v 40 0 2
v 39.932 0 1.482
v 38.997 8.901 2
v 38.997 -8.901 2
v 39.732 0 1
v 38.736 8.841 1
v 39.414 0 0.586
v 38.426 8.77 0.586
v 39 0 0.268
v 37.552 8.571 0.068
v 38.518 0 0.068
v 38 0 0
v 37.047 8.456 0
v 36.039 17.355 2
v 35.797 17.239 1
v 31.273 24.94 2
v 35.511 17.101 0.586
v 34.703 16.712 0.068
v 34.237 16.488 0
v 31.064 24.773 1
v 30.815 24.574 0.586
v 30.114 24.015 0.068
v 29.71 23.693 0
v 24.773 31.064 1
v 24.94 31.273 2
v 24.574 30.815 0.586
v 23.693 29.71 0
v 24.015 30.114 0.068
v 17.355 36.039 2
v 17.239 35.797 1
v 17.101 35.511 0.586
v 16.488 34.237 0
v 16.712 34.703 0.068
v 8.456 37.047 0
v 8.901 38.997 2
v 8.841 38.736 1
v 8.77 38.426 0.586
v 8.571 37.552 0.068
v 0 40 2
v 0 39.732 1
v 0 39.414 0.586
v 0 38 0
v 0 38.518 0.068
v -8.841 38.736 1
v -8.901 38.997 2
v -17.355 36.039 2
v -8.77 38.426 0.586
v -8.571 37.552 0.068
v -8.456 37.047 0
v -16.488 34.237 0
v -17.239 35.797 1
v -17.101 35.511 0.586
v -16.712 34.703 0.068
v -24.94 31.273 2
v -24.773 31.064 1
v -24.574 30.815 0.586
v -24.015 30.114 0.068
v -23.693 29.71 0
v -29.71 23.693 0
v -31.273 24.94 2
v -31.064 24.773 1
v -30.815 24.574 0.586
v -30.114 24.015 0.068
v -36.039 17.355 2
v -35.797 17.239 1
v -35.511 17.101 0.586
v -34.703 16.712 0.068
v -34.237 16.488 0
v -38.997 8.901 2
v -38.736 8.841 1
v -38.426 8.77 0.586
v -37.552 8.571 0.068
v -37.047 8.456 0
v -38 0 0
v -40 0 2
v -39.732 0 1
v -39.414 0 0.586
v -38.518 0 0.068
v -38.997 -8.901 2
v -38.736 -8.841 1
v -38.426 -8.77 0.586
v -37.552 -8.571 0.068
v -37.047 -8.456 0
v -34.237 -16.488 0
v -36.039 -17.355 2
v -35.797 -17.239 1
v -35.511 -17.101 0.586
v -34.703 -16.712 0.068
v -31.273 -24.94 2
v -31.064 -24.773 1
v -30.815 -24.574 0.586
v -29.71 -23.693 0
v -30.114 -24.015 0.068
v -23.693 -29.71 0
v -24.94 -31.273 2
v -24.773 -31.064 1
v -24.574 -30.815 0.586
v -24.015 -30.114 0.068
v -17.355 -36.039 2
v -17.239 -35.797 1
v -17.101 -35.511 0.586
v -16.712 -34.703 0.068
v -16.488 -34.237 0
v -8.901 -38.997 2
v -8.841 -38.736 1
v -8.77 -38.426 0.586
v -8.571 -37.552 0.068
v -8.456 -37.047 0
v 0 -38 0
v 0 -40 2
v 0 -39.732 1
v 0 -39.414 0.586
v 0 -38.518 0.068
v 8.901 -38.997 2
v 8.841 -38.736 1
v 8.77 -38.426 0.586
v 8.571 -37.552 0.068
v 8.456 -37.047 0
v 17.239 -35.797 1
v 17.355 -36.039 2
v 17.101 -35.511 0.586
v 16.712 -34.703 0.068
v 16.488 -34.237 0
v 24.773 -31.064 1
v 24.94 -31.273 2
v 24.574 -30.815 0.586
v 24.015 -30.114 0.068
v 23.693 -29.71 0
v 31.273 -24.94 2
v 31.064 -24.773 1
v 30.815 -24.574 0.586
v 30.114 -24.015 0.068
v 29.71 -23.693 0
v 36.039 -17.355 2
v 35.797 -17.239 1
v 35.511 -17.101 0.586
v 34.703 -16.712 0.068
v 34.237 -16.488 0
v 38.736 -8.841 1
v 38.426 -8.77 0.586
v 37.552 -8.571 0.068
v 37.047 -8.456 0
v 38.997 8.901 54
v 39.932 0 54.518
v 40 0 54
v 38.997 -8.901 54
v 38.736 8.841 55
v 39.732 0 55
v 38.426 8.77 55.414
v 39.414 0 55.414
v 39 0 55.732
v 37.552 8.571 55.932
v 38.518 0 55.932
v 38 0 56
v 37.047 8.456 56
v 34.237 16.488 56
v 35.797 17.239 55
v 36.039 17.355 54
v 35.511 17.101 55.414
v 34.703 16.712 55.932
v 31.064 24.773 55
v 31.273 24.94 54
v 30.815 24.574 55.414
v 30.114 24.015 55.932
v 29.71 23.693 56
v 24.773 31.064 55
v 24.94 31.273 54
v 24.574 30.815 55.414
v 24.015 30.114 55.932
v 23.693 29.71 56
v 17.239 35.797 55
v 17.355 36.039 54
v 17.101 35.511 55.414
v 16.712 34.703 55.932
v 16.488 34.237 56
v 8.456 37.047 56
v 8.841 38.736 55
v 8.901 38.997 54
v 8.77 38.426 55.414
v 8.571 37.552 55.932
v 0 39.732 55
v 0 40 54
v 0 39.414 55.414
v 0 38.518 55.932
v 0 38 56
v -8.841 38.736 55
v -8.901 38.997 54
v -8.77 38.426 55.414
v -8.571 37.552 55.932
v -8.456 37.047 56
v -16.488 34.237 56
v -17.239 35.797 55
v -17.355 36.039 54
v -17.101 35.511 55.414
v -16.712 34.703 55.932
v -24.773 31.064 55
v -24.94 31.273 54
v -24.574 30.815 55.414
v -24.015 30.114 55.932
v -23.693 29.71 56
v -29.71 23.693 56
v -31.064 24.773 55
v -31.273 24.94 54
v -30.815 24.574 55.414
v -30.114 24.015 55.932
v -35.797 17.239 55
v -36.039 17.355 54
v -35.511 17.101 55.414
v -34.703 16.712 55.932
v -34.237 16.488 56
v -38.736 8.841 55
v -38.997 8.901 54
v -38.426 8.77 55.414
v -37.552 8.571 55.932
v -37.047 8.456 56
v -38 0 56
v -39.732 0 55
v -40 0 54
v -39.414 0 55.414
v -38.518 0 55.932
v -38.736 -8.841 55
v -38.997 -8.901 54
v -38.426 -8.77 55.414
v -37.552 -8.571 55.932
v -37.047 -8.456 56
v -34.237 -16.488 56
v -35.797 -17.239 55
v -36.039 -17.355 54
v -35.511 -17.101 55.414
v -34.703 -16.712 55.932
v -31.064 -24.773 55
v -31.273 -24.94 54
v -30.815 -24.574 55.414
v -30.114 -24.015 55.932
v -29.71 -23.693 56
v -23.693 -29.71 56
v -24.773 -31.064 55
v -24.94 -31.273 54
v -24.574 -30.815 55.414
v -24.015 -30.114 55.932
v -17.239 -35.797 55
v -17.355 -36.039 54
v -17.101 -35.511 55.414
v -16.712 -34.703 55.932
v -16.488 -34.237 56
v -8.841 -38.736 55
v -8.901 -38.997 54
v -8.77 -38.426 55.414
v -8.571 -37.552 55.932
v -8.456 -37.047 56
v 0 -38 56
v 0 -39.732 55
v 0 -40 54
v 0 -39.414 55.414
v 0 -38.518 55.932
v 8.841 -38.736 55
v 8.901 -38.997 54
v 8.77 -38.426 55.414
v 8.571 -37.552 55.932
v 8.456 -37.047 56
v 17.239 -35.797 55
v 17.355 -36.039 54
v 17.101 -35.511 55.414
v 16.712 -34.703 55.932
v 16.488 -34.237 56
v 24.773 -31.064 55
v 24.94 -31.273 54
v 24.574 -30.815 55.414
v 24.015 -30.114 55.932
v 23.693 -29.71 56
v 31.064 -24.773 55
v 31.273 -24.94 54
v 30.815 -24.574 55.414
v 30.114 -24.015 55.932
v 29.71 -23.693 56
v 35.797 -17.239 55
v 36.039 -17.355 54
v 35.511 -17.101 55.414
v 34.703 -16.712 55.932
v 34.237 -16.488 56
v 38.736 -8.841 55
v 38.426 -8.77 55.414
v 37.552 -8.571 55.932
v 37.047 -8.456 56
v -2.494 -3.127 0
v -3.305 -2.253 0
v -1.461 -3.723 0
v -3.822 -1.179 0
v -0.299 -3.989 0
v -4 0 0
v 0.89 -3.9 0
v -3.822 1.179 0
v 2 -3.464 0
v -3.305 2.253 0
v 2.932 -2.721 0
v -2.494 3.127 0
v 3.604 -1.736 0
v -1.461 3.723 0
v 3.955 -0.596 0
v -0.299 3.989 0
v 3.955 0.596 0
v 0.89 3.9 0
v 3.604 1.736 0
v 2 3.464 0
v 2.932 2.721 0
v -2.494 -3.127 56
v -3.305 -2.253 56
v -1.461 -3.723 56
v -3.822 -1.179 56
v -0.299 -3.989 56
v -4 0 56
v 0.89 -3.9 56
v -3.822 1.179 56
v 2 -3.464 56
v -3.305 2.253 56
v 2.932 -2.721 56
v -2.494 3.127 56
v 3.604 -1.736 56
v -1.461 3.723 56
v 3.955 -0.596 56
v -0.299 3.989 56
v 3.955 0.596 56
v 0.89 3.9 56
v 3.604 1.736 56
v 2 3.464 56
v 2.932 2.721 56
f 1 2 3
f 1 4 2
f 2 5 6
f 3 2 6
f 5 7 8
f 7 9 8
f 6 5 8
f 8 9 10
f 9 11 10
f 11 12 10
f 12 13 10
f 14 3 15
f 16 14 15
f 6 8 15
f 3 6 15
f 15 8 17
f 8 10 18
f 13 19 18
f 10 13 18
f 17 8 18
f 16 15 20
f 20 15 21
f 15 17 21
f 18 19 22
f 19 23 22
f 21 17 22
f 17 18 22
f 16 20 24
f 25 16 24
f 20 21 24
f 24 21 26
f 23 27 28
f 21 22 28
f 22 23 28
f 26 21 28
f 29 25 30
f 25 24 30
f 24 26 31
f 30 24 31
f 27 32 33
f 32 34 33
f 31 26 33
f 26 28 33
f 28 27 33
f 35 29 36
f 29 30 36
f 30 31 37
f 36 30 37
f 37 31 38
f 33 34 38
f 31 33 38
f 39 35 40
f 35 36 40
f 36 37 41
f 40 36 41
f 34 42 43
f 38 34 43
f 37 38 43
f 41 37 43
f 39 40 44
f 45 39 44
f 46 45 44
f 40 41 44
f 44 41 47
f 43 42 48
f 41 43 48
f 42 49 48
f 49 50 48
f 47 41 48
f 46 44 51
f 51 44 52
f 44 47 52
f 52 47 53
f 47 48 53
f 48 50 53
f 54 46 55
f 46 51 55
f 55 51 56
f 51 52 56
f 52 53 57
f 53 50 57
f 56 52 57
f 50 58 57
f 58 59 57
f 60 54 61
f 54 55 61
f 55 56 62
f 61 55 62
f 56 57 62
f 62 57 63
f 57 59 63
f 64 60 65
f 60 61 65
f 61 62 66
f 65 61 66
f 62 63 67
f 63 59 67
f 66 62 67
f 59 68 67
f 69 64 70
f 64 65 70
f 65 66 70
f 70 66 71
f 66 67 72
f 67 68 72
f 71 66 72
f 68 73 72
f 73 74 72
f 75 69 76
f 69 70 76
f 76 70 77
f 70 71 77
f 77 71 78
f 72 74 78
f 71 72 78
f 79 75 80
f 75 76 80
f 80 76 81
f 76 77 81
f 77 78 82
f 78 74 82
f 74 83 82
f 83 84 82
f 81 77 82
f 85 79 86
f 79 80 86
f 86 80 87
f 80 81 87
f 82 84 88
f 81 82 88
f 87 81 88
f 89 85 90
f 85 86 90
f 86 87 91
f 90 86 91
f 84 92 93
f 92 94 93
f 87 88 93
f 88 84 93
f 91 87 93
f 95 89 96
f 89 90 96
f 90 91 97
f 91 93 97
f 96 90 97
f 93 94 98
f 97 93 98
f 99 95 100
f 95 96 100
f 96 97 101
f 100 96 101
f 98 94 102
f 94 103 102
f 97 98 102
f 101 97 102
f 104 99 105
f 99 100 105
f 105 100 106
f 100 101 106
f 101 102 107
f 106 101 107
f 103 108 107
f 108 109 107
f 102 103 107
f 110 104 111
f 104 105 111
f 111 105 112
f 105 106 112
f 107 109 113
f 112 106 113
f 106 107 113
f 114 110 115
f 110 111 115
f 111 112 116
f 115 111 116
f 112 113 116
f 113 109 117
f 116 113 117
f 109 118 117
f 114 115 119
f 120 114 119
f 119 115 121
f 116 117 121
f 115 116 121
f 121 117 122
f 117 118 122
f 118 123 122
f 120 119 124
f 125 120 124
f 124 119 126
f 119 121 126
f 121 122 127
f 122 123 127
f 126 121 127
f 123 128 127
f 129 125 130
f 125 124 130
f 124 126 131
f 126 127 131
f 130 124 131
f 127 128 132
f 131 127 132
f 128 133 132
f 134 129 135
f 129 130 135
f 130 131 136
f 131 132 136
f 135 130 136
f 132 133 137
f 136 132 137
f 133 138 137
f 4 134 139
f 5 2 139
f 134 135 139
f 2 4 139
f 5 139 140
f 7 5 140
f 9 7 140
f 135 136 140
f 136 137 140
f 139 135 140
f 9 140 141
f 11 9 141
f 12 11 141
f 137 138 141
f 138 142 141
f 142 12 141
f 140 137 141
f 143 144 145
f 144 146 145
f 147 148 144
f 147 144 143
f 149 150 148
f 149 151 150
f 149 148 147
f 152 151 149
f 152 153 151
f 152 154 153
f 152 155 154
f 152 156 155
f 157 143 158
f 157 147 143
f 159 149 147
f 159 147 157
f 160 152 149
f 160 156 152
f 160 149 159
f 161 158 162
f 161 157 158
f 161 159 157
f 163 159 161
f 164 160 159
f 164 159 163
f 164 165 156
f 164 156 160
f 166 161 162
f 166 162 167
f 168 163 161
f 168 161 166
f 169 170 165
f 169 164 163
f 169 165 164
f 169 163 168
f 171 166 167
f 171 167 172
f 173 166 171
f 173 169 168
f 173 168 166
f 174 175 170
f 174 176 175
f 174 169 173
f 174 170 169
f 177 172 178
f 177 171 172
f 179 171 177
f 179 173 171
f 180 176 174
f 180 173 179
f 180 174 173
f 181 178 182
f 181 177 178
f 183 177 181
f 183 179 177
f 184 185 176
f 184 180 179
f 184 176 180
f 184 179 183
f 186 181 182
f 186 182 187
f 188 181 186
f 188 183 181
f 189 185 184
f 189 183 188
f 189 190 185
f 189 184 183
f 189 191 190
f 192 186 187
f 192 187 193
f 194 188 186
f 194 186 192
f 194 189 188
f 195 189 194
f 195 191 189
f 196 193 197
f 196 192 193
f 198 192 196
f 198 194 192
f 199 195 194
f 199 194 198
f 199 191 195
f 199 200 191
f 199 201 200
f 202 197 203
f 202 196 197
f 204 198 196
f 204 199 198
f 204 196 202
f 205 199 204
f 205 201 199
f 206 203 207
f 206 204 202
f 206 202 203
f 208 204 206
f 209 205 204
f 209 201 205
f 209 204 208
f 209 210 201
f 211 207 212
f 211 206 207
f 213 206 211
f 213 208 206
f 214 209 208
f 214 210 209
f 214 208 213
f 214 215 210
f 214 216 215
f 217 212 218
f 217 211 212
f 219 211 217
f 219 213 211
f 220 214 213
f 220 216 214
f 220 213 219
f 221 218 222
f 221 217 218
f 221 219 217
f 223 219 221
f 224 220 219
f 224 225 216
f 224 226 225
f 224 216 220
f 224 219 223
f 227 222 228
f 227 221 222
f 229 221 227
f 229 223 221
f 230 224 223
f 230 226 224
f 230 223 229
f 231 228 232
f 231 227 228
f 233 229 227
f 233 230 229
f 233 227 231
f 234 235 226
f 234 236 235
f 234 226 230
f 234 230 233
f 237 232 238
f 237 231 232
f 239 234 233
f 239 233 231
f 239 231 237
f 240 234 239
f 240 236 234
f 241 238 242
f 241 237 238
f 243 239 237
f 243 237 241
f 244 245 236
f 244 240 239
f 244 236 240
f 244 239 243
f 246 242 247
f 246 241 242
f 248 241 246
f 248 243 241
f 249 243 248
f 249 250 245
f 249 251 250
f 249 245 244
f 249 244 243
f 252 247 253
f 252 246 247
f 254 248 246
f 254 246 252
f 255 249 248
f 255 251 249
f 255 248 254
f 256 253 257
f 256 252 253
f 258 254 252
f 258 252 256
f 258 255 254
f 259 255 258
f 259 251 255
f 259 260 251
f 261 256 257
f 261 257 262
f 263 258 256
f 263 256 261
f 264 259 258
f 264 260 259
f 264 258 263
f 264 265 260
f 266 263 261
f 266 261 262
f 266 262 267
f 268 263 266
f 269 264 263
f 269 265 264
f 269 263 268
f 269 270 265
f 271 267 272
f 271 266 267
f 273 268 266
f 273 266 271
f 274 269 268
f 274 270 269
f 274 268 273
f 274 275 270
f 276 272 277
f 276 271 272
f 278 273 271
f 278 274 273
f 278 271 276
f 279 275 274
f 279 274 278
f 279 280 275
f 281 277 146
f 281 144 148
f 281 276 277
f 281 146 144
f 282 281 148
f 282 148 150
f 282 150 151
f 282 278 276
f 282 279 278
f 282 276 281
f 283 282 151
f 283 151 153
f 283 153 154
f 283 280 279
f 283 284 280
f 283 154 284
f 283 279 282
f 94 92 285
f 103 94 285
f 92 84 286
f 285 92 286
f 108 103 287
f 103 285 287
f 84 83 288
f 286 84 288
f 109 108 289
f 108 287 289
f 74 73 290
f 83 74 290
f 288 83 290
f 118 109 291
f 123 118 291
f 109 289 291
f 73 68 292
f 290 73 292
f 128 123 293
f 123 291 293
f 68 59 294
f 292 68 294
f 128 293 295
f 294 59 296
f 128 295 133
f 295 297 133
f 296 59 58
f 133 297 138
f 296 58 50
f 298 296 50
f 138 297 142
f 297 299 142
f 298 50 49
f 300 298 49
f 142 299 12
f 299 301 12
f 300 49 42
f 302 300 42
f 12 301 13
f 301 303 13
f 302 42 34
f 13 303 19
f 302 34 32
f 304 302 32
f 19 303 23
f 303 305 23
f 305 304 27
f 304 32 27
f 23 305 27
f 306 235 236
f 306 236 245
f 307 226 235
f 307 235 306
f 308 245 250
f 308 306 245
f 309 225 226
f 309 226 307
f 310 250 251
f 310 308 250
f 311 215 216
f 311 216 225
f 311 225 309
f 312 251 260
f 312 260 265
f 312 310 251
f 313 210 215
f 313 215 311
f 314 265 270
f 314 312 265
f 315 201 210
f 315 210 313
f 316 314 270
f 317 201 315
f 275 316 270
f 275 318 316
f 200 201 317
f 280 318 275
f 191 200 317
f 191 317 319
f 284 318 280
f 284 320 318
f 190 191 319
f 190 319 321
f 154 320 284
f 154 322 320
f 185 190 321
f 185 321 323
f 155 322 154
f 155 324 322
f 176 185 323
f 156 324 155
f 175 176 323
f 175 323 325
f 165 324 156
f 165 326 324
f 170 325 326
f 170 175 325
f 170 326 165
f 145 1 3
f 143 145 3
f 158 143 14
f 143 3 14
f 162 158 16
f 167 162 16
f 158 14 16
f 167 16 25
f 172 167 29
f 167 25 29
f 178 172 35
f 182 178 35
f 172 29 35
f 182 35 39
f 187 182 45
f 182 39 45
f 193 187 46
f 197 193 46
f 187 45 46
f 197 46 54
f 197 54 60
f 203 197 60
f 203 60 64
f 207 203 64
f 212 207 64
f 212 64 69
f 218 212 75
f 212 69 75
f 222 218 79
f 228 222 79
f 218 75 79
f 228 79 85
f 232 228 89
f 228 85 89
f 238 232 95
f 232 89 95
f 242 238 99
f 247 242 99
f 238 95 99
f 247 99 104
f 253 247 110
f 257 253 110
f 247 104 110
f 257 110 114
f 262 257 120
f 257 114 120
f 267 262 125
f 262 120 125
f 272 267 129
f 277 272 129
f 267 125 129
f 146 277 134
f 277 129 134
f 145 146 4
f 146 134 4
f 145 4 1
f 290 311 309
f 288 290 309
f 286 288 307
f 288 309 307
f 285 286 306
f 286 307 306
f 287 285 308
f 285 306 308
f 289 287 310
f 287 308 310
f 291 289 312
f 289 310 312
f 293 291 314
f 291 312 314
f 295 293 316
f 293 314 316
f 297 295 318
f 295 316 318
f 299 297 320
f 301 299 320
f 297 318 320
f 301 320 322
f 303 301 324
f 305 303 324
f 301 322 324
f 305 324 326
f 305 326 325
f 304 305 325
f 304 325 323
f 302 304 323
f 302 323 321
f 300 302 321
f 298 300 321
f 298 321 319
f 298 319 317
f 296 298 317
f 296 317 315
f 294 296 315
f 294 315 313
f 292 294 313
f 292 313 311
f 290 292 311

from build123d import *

# Parameters (mm, degrees)
F0_R     = 40
F1_DEPTH = 56
F2_D     = 8
F3_R     = 2


with BuildPart() as f1:
    # F0 (on Top) → F1 (new body)
    with BuildSketch(Plane.XY):
        Circle(F0_R)
    extrude(amount=F1_DEPTH)

    # F2 (through all)
    with Locations(Plane(origin=(0, 0, 0), x_dir=(1, 0, 0), z_dir=(0, 0, -1))):
        with Locations((0, 0)):
            Hole(F2_D / 2)

    # F3
    f3_edges = [f1.edges().sort_by_distance(p)[0] for p in [
        (40, 0, 28),
        (-40, 0, 0),
        (-40, 0, 56),
    ]]
    fillet(f3_edges, radius=F3_R)


solid = f1.part
